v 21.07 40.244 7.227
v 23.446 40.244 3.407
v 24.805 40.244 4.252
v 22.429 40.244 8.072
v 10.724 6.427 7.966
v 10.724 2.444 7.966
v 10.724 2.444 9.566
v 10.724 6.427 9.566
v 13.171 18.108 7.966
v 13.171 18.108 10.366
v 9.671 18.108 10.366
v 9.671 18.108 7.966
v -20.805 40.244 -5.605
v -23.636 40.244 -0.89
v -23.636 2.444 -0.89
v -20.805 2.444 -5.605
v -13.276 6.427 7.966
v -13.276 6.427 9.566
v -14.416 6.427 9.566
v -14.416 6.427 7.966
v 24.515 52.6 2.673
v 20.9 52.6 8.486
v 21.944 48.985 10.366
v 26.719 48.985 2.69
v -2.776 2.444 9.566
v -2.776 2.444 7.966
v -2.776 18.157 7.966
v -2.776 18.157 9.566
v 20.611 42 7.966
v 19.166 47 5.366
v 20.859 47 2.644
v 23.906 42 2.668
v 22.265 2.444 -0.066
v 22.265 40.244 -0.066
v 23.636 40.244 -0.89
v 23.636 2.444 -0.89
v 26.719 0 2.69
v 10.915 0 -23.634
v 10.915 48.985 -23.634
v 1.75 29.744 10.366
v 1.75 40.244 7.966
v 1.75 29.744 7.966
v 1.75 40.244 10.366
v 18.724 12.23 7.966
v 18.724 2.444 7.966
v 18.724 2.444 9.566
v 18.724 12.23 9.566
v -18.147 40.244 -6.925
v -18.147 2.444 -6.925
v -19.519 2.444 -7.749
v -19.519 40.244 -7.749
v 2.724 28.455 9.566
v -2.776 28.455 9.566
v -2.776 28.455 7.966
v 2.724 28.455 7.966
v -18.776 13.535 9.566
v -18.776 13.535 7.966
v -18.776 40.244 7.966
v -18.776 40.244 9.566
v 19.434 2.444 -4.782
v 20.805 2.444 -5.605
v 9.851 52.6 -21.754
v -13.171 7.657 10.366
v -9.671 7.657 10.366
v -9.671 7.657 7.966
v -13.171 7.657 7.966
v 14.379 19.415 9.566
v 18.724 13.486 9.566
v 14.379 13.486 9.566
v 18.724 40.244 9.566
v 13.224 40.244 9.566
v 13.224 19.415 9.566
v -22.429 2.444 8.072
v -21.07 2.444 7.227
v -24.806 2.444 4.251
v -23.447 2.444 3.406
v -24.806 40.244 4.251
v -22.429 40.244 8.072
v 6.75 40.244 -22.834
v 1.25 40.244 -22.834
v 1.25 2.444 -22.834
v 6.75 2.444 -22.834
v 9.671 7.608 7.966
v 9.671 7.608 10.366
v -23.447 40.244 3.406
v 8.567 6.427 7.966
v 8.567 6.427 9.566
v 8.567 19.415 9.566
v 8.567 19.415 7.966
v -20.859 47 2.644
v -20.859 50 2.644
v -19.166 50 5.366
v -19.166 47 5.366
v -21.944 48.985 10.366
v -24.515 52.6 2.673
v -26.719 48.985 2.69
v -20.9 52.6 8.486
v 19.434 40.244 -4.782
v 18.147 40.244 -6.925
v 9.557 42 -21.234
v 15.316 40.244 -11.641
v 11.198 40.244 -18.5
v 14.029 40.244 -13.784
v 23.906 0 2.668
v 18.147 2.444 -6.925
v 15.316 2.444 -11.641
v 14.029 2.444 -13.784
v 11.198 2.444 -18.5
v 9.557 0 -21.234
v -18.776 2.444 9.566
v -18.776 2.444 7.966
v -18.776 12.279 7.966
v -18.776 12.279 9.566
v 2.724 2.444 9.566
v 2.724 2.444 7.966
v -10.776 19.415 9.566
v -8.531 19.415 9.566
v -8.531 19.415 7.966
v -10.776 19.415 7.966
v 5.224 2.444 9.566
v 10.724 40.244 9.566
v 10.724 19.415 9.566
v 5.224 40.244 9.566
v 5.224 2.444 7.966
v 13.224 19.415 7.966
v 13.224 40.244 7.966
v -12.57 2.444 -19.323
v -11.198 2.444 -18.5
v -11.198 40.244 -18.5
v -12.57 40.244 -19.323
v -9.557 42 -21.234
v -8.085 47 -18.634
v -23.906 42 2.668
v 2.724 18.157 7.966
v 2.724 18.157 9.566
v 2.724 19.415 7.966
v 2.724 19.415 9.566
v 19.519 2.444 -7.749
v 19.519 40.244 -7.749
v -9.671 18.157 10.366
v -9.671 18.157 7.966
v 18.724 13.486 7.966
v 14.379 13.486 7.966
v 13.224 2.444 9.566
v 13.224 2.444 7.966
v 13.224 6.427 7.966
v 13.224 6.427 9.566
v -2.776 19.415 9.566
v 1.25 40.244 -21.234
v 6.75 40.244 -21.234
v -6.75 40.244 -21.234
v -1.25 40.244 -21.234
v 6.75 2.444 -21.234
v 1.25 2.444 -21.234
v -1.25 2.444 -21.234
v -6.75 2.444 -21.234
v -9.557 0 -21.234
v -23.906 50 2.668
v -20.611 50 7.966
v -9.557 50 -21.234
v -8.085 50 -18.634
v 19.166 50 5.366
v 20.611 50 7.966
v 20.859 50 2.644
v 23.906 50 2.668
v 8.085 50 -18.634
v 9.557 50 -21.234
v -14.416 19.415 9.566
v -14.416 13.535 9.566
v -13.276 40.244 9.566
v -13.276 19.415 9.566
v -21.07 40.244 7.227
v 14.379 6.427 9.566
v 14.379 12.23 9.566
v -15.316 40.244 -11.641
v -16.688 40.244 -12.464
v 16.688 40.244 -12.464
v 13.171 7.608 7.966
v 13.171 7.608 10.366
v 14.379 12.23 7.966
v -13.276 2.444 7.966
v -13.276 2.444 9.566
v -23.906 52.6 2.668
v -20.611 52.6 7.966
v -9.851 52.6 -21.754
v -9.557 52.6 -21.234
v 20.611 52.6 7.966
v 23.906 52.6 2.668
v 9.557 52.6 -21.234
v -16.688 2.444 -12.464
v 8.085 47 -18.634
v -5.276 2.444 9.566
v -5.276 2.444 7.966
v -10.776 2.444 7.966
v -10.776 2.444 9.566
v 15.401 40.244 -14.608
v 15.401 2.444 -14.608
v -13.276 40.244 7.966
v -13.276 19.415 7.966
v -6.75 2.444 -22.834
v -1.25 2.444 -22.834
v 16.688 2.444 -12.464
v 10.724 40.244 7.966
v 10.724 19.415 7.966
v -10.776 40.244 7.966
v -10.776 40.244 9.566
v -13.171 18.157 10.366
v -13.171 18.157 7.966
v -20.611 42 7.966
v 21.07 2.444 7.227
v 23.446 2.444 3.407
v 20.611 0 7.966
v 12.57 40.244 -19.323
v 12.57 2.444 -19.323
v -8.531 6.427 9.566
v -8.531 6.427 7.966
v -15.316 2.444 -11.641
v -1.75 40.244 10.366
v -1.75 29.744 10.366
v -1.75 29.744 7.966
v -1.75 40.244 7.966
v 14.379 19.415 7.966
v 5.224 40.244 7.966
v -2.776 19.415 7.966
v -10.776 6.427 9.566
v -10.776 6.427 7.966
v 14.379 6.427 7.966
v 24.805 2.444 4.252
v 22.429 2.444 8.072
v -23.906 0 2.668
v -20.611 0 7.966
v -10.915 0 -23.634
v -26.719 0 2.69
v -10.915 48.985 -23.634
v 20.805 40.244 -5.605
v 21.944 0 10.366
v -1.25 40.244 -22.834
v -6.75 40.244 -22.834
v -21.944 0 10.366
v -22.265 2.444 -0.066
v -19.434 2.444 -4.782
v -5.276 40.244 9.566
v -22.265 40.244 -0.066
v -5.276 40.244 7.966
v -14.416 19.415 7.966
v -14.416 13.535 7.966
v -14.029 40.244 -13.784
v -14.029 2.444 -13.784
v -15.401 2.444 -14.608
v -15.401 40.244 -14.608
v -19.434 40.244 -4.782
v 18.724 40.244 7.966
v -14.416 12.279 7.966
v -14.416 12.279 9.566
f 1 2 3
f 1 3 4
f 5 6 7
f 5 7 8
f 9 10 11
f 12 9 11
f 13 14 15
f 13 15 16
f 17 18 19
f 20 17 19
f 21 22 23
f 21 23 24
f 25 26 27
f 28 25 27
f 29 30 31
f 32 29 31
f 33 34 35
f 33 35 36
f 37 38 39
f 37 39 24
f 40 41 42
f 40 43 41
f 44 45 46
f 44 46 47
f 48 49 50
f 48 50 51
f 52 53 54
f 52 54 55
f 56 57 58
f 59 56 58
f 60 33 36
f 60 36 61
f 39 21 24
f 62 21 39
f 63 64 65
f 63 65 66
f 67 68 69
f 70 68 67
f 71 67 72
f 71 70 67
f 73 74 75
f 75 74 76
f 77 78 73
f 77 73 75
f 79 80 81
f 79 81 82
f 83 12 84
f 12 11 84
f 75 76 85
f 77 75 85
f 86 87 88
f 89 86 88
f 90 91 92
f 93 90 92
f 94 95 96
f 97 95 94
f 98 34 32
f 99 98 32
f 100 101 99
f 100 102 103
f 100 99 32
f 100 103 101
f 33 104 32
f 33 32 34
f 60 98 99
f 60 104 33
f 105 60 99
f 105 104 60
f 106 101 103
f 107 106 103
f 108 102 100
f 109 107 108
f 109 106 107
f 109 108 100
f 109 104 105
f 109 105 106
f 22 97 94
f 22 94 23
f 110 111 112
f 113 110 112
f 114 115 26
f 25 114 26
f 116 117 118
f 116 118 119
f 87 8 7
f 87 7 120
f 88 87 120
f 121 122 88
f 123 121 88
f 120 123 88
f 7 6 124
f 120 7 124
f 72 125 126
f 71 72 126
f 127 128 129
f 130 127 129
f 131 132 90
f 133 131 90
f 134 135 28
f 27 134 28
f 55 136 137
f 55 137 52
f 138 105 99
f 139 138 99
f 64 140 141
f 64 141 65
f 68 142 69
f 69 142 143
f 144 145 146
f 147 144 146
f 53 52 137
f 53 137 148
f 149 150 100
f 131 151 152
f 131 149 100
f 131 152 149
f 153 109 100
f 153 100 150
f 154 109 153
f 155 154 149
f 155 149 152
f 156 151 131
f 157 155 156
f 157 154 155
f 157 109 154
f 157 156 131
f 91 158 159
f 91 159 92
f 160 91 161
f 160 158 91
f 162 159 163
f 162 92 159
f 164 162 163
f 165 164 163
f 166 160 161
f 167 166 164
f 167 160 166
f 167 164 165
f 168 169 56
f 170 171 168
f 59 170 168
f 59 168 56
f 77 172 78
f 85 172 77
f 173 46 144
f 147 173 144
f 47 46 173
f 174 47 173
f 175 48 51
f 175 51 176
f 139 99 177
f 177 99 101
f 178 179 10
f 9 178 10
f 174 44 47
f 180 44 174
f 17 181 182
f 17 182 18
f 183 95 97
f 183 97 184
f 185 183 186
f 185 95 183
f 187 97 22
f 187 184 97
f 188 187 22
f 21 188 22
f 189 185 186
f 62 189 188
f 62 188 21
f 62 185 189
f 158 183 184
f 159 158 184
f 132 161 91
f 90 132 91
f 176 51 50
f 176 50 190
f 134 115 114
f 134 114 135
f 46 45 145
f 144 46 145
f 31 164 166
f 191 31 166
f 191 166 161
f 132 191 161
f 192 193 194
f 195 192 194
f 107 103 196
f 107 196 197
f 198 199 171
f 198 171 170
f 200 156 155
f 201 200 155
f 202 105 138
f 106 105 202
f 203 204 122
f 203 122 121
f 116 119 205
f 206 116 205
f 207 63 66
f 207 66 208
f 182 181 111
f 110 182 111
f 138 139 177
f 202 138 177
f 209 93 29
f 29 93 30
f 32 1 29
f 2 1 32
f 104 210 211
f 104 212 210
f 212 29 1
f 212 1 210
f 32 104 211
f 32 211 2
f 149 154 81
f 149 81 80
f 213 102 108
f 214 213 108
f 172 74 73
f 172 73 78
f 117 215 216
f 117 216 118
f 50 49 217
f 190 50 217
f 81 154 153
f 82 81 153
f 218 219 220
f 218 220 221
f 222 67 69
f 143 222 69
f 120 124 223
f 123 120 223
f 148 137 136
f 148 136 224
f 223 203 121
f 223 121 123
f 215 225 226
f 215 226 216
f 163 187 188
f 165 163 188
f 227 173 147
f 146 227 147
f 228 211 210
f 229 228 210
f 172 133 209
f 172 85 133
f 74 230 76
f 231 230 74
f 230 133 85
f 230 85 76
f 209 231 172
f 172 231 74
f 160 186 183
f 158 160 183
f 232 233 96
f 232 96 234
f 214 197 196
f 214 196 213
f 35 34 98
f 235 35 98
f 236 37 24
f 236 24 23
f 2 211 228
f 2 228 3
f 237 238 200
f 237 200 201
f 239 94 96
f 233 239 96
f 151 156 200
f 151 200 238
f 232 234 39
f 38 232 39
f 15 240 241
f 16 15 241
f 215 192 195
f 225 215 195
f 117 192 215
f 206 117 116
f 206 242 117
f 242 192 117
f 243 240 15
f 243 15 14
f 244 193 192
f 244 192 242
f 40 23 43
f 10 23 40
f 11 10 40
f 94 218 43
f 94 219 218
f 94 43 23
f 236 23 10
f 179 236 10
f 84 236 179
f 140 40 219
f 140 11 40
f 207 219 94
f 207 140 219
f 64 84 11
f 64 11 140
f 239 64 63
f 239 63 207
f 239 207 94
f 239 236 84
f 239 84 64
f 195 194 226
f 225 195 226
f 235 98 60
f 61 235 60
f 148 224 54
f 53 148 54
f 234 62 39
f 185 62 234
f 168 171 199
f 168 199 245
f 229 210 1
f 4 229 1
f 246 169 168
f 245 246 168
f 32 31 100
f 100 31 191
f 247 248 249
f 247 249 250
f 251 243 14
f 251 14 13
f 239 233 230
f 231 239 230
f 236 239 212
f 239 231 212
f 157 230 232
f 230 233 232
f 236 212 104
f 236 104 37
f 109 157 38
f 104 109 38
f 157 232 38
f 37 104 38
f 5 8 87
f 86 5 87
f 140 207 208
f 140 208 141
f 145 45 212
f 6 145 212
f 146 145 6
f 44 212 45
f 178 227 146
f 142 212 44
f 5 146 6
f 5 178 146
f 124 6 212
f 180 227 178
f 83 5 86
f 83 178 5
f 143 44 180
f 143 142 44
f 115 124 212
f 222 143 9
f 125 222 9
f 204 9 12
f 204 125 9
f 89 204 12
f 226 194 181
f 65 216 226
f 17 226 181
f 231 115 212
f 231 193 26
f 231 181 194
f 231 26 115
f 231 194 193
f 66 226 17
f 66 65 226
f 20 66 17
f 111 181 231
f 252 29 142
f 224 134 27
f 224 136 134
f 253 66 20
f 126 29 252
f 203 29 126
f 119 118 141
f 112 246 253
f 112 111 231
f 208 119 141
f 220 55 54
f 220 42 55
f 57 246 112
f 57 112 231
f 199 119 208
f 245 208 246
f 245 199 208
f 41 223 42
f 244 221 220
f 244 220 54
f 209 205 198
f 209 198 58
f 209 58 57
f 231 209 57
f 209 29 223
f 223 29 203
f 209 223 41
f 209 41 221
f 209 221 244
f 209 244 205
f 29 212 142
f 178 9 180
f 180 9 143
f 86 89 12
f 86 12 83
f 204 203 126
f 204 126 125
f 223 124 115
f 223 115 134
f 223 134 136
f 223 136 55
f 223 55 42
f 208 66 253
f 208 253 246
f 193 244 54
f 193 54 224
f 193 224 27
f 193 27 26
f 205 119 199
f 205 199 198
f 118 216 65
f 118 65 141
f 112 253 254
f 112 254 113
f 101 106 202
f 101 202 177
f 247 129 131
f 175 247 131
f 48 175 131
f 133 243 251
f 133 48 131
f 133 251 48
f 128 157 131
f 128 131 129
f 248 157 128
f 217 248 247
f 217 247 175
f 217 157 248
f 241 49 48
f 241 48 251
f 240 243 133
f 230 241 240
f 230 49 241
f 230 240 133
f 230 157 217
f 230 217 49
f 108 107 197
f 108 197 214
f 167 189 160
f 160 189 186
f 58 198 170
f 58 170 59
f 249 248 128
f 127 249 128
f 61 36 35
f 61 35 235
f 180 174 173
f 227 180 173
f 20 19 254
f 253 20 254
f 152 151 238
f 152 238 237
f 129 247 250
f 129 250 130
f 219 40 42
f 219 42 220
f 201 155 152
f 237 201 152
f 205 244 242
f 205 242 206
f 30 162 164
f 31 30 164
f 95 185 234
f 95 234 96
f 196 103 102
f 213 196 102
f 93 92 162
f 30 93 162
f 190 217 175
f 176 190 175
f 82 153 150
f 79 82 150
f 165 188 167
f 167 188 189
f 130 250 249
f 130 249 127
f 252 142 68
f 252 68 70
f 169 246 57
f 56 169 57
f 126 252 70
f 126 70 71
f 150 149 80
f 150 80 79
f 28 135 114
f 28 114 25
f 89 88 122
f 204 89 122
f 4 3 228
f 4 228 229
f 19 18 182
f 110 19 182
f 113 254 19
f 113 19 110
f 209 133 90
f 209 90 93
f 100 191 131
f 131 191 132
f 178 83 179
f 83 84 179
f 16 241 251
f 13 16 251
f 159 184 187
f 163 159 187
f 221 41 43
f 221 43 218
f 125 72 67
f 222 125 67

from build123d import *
from OCP.BRepFilletAPI import BRepFilletAPI_MakeChamfer

# Parameters (mm, degrees)
BOSS_EXTRUDE1_DEPTH     = 52.6
BOSS_EXTRUDE2_DEPTH     = 10.6
CUT_EXTRUDE1_DEPTH      = 2.6
CHAMFER1_SIZE           = 4
CHAMFER1_SIZE2          = 2.08
CHAMFER2_SIZE           = 2.6
CHAMFER2_SIZE_2         = 5
SKETCH4_W               = 3.5
SKETCH4_H               = 10.5
CUT_EXTRUDE2_DEPTH      = 10
CUT_EXTRUDE3_DEPTH      = 61
SKETCH7_W               = 5.5
SKETCH7_H               = 37.8
CUT_EXTRUDE4_DEPTH      = 1.6
LPATTERN1_COUNT         = 3
LPATTERN1_PITCH         = 8
LPATTERN1_COL_COUNT     = 3
LPATTERN1_COL_PITCH     = 8
BOSS_EXTRUDE4_DEPTH     = 1.6
SKETCH9_W               = 1.140450815
SKETCH9_H               = 12.988078935
BOSS_EXTRUDE5_DEPTH     = 1.6
BOSS_EXTRUDE6_DEPTH     = 1.6
SKETCH12_W              = 5.5
SKETCH12_H              = 1.257878545
BOSS_EXTRUDE7_DEPTH     = 1.6
SKETCH13_W              = 4.498542915
SKETCH13_H              = 37.8
CUT_EXTRUDE5_DEPTH      = 1.6
SKETCH14_W              = 4.344795522
SKETCH14_H              = 1.255742166
SKETCH14_W_2            = 4.359549185
SKETCH14_H_2            = 1.256348334
BOSS_EXTRUDE8_DEPTH     = 1.6
SKETCH15_W              = 4.5
SKETCH15_H              = 37.8
CUT_EXTRUDE6_DEPTH      = 1.6
SKETCH16_W              = 5.5
SKETCH16_H              = 37.8
CUT_EXTRUDE7_DEPTH      = 1.6
LPATTERN2_COUNT         = 2
LPATTERN2_PITCH         = 8
LPATTERN2_COL_COUNT     = 2
LPATTERN2_COL_PITCH     = 8
MIRROR2_COPY_1_SKETCH_W = 5.5
MIRROR2_COPY_1_SKETCH_H = 37.8
MIRROR2_COPY_1_DEPTH    = 1.6
MIRROR2_COPY_2_SKETCH_W = 5.5
MIRROR2_COPY_2_SKETCH_H = 37.8
MIRROR2_COPY_2_DEPTH    = 1.6
SKETCH17_W              = 5.5
SKETCH17_H              = 37.8
CUT_EXTRUDE8_DEPTH      = 1.6
LPATTERN3_COUNT         = 2
LPATTERN3_PITCH         = 8


with BuildPart() as part:
    # Sketch1 → Boss-Extrude1 (new body)
    with BuildSketch(Plane(origin=(0, 0, 0), x_dir=(1, 0, 0), z_dir=(0, 1, 0))):
        Polygon((-26.953018279, -2.69203799), (-22.055294719, -10.566070483), (22.055294719, -10.566070483), (26.953018279, -2.69203799), (11.028337958, 23.833929517), (-11.028337958, 23.833929517), align=None)
        Polygon((-23.906036559, -2.668005496), (-20.610589438, -7.966070483), (20.610589438, -7.966070483), (23.906036559, -2.668005496), (9.556675916, 21.233929517), (-9.556675916, 21.233929517), align=None, mode=Mode.SUBTRACT)
    extrude(amount=BOSS_EXTRUDE1_DEPTH)

    # Sketch2 → Boss-Extrude2 (add)
    with BuildSketch(Plane(origin=(0, 52.6, 0), x_dir=(1, 0, 0), z_dir=(0, 1, 0))):
        Polygon((-23.906036559, -2.668005496), (-20.610589438, -7.966070483), (20.610589438, -7.966070483), (23.906036559, -2.668005496), (9.556675916, 21.233929517), (-9.556675916, 21.233929517), align=None)
        Polygon((-20.859054838, -2.643973003), (-19.165884157, -5.366070483), (19.165884157, -5.366070483), (20.859054838, -2.643973003), (8.085013874, 18.633929517), (-8.085013874, 18.633929517), align=None, mode=Mode.SUBTRACT)
    extrude(amount=-BOSS_EXTRUDE2_DEPTH)

    # Sketch3 → Cut-Extrude1 (cut)
    with BuildSketch(Plane(origin=(0, 52.6, 0), x_dir=(1, 0, 0), z_dir=(0, 1, 0))):
        Polygon((-23.906036559, -2.668005496), (-20.610589438, -7.966070483), (20.610589438, -7.966070483), (23.906036559, -2.668005496), (9.556675916, 21.233929517), (-9.556675916, 21.233929517), align=None)
        Polygon((-20.859054838, -2.643973003), (-19.165884157, -5.366070483), (19.165884157, -5.366070483), (20.859054838, -2.643973003), (8.085013874, 18.633929517), (-8.085013874, 18.633929517), align=None, mode=Mode.SUBTRACT)
    extrude(amount=-CUT_EXTRUDE1_DEPTH, mode=Mode.SUBTRACT)

    # Chamfer1: one chamfer whose edges measure the first distance from different faces: ONE call of the kernel's chamfer builder (chamfer() names one face for all edges)
    chamfer1_edges_1 = [part.edges().sort_by_distance(p)[0] for p in [
        (-18.990678119, 52.6, -10.570945764),
    ]]
    chamfer1_side_1 = [part.faces().sort_by_distance(p)[0] for p in [
        (-18.990678119, 26.3, -10.570945764),
    ]]
    chamfer1_edges_2 = [part.edges().sort_by_distance(p)[0] for p in [
        (-24.504156499, 52.6, 6.629054236),
    ]]
    chamfer1_side_2 = [part.faces().sort_by_distance(p)[0] for p in [
        (-24.504156499, 26.3, 6.629054236),
    ]]
    chamfer1_edges_3 = [part.edges().sort_by_distance(p)[0] for p in [
        (0, 52.6, 10.566070483),
    ]]
    chamfer1_side_3 = [part.faces().sort_by_distance(p)[0] for p in [
        (0, 26.3, 10.566070483),
    ]]
    chamfer1_edges_4 = [part.edges().sort_by_distance(p)[0] for p in [
        (24.504156499, 52.6, 6.629054236),
    ]]
    chamfer1_side_4 = [part.faces().sort_by_distance(p)[0] for p in [
        (24.504156499, 26.3, 6.629054236),
    ]]
    chamfer1_edges_5 = [part.edges().sort_by_distance(p)[0] for p in [
        (18.990678119, 52.6, -10.570945764),
    ]]
    chamfer1_side_5 = [part.faces().sort_by_distance(p)[0] for p in [
        (18.990678119, 26.3, -10.570945764),
    ]]
    chamfer1_edges_6 = [part.edges().sort_by_distance(p)[0] for p in [
        (0, 52.6, -23.833929517),
    ]]
    chamfer1_side_6 = [part.faces().sort_by_distance(p)[0] for p in [
        (0, 26.3, -23.833929517),
    ]]
    chamfer1 = BRepFilletAPI_MakeChamfer(part.part.solid().wrapped)
    for e in chamfer1_edges_1:
        chamfer1.Add(CHAMFER1_SIZE, CHAMFER1_SIZE2, e.wrapped, chamfer1_side_1[0].wrapped)  # the first distance lies on this face
    for e in chamfer1_edges_2:
        chamfer1.Add(CHAMFER1_SIZE, CHAMFER1_SIZE2, e.wrapped, chamfer1_side_2[0].wrapped)  # the first distance lies on this face
    for e in chamfer1_edges_3:
        chamfer1.Add(CHAMFER1_SIZE, CHAMFER1_SIZE2, e.wrapped, chamfer1_side_3[0].wrapped)  # the first distance lies on this face
    for e in chamfer1_edges_4:
        chamfer1.Add(CHAMFER1_SIZE, CHAMFER1_SIZE2, e.wrapped, chamfer1_side_4[0].wrapped)  # the first distance lies on this face
    for e in chamfer1_edges_5:
        chamfer1.Add(CHAMFER1_SIZE, CHAMFER1_SIZE2, e.wrapped, chamfer1_side_5[0].wrapped)  # the first distance lies on this face
    for e in chamfer1_edges_6:
        chamfer1.Add(CHAMFER1_SIZE, CHAMFER1_SIZE2, e.wrapped, chamfer1_side_6[0].wrapped)  # the first distance lies on this face
    add(Compound.cast(chamfer1.Shape()), mode=Mode.REPLACE)

    # Chamfer2
    chamfer2_edges_1 = [part.edges().sort_by_distance(p)[0] for p in [
        (0, 42, -18.633929517),
    ]]
    chamfer2_side_1 = [part.faces().sort_by_distance(p)[0] for p in [
        (0, 42, -18.685929517),
    ]]
    chamfer2_edges_2 = [part.edges().sort_by_distance(p)[0] for p in [
        (-14.472034356, 42, -7.994978257),
    ]]
    chamfer2_side_2 = [part.faces().sort_by_distance(p)[0] for p in [
        (-14.516617239, 42, -8.021743281),
    ]]
    chamfer2_edges_3 = [part.edges().sort_by_distance(p)[0] for p in [
        (-20.012469497, 42, 4.005021743),
    ]]
    chamfer2_side_3 = [part.faces().sort_by_distance(p)[0] for p in [
        (-20.056624652, 42, 4.032486672),
    ]]
    chamfer2_edges_4 = [part.edges().sort_by_distance(p)[0] for p in [
        (0, 42, 5.366070483),
    ]]
    chamfer2_side_4 = [part.faces().sort_by_distance(p)[0] for p in [
        (0, 42, 5.418070483),
    ]]
    chamfer2_edges_5 = [part.edges().sort_by_distance(p)[0] for p in [
        (20.012469497, 42, 4.005021743),
    ]]
    chamfer2_side_5 = [part.faces().sort_by_distance(p)[0] for p in [
        (20.056624652, 42, 4.032486672),
    ]]
    chamfer2_edges_6 = [part.edges().sort_by_distance(p)[0] for p in [
        (14.472034356, 42, -7.994978257),
    ]]
    chamfer2_side_6 = [part.faces().sort_by_distance(p)[0] for p in [
        (14.516617239, 42, -8.021743281),
    ]]
    chamfer2 = BRepFilletAPI_MakeChamfer(part.part.solid().wrapped)
    for e in chamfer2_edges_1:
        chamfer2.Add(CHAMFER2_SIZE - 0.0001, CHAMFER2_SIZE_2 - 0.0001, e.wrapped, chamfer2_side_1[0].wrapped)
    for e in chamfer2_edges_2:
        chamfer2.Add(CHAMFER2_SIZE - 0.0001, CHAMFER2_SIZE_2 - 0.0001, e.wrapped, chamfer2_side_2[0].wrapped)
    for e in chamfer2_edges_3:
        chamfer2.Add(CHAMFER2_SIZE - 0.0001, CHAMFER2_SIZE_2 - 0.0001, e.wrapped, chamfer2_side_3[0].wrapped)
    for e in chamfer2_edges_4:
        chamfer2.Add(CHAMFER2_SIZE - 0.0001, CHAMFER2_SIZE_2 - 0.0001, e.wrapped, chamfer2_side_4[0].wrapped)
    for e in chamfer2_edges_5:
        chamfer2.Add(CHAMFER2_SIZE - 0.0001, CHAMFER2_SIZE_2 - 0.0001, e.wrapped, chamfer2_side_5[0].wrapped)
    for e in chamfer2_edges_6:
        chamfer2.Add(CHAMFER2_SIZE - 0.0001, CHAMFER2_SIZE_2 - 0.0001, e.wrapped, chamfer2_side_6[0].wrapped)
    add(Compound.cast(chamfer2.Shape()), mode=Mode.REPLACE)  # a hair under: the kernel refuses the full size

    # Sketch4 → Cut-Extrude2 (cut)
    with BuildSketch(Plane.XY.offset(10.566070483)):
        with Locations((0, 34.994195005)):
            Rectangle(SKETCH4_W, SKETCH4_H)
        with Locations((-11.42081888, 12.906843201)):
            Rectangle(SKETCH4_W, SKETCH4_H)
        with Locations((11.42081888, 12.857646379)):
            Rectangle(SKETCH4_W, SKETCH4_H)
    extrude(amount=-CUT_EXTRUDE2_DEPTH, mode=Mode.SUBTRACT)

    # Sketch6 → Cut-Extrude3 (cut)
    with BuildSketch(Plane.XZ):
        Polygon((11.028337958, -23.833929517), (26.953018279, 2.69203799), (22.055294719, 10.566070483), (-22.055294719, 10.566070483), (-26.953018279, 2.69203799), (-11.028337958, -23.833929517), align=None)
        Polygon((10.915133186, -23.633929517), (26.71863507, 2.690189336), (21.944163543, 10.366070483), (-21.944163543, 10.366070483), (-26.71863507, 2.690189336), (-10.915133186, -23.633929517), align=None, mode=Mode.SUBTRACT)
    extrude(amount=-CUT_EXTRUDE3_DEPTH, mode=Mode.SUBTRACT)

    # Sketch7 → Cut-Extrude4 (cut)
    with BuildSketch(Plane(origin=(0, 0, 7.966070483), x_dir=(-1, 0, 0), z_dir=(0, 0, -1))):
        with Locations((0.025767353, 21.344195005)):
            Rectangle(SKETCH7_W, SKETCH7_H)
    cut_extrude4 = extrude(amount=-CUT_EXTRUDE4_DEPTH, mode=Mode.SUBTRACT)

    # LPattern1: Cut-Extrude4 ×3
    with Locations(*[(-i * LPATTERN1_PITCH, 0, 0) for i in range(1, LPATTERN1_COUNT)]):
        add(cut_extrude4, mode=Mode.SUBTRACT)

    # LPattern1 col: Cut-Extrude4 ×3
    with Locations(*[(i * LPATTERN1_COL_PITCH, 0, 0) for i in range(1, LPATTERN1_COL_COUNT)]):
        add(cut_extrude4, mode=Mode.SUBTRACT)

    # Sketch8 → Boss-Extrude4 (add)
    with BuildSketch(Plane(origin=(0, 0, 9.566070483), x_dir=(-1, 0, 0), z_dir=(0, 0, -1))):
        Polygon((2.775767353, 40.244195005), (2.775767353, 28.454622031), (-2.724232647, 28.454622031), (-2.724232647, 40.244195005), (-1.75, 40.244195005), (-1.75, 29.744195005), (1.75, 29.744195005), (1.75, 40.244195005), align=None)
    extrude(amount=BOSS_EXTRUDE4_DEPTH)

    # Sketch9 → Boss-Extrude5 (add)
    with BuildSketch(Plane(origin=(0, 0, 9.566070483), x_dir=(-1, 0, 0), z_dir=(0, 0, -1))):
        Polygon((10.775767353, 18.156843201), (9.67081888, 18.156843201), (9.67081888, 7.656843201), (10.775767353, 7.656843201), (10.775767353, 6.426642811), (8.531242664, 6.426642811), (8.531242664, 19.414721746), (10.775767353, 19.414721746), align=None)
        with Locations((13.84599276, 12.920682279)):
            Rectangle(SKETCH9_W, SKETCH9_H)
    extrude(amount=BOSS_EXTRUDE5_DEPTH)

    # Sketch11 → Boss-Extrude6 (add)
    with BuildSketch(Plane(origin=(0, 0, 9.566070483), x_dir=(-1, 0, 0), z_dir=(0, 0, -1))):
        Polygon((-10.724232647, 18.107646379), (-9.67081888, 18.107646379), (-9.67081888, 7.607646379), (-10.724232647, 7.607646379), (-10.724232647, 6.426642811), (-8.566553257, 6.426642811), (-8.566553257, 19.414721746), (-10.724232647, 19.414721746), align=None)
        Polygon((-13.17081888, 18.107646379), (-13.224232647, 19.414721746), (-14.379437125, 19.414721746), (-14.379437125, 6.426642811), (-13.17081888, 6.426642811), align=None)
    extrude(amount=BOSS_EXTRUDE6_DEPTH)

    # Sketch12 → Boss-Extrude7 (add)
    with BuildSketch(Plane(origin=(0, 0, 9.566070483), x_dir=(-1, 0, 0), z_dir=(0, 0, -1))):
        with Locations((0.025767353, 18.785782473)):
            Rectangle(SKETCH12_W, SKETCH12_H)
    extrude(amount=BOSS_EXTRUDE7_DEPTH)

    # Sketch13 → Cut-Extrude5 (cut)
    with BuildSketch(Plane(origin=(18.433655639, 0, 11.465910206), x_dir=(-0.5281717070926116, 0, 0.8491375906335065), z_dir=(-0.8491375906335065, 0, -0.5281717070926116))):
        with Locations((-7.241314346, 21.344195005)):
            Rectangle(SKETCH13_W, SKETCH13_H)
    extrude(amount=-CUT_EXTRUDE5_DEPTH, mode=Mode.SUBTRACT)

    # Sketch14 → Boss-Extrude8 (add)
    with BuildSketch(Plane(origin=(0, 0, 7.966070483), x_dir=(-1, 0, 0), z_dir=(0, 0, -1))):
        with Locations((-16.551834886, 12.857646379)):
            Rectangle(SKETCH14_W, SKETCH14_H)
        with Locations((16.595992761, 12.906843201)):
            Rectangle(SKETCH14_W_2, SKETCH14_H_2)
    extrude(amount=-BOSS_EXTRUDE8_DEPTH)

    # Sketch15 → Cut-Extrude6 (cut)
    with BuildSketch(Plane(origin=(-18.433655639, 0, 11.465910206), x_dir=(-0.5281717070926114, 0, -0.8491375906335067), z_dir=(0.8491375906335068, 0, -0.5281717070926114))):
        with Locations((7.242042888, 21.344195005)):
            Rectangle(SKETCH15_W, SKETCH15_H)
    extrude(amount=-CUT_EXTRUDE6_DEPTH, mode=Mode.SUBTRACT)

    # Sketch16 → Cut-Extrude7 (cut)
    with BuildSketch(Plane(origin=(-16.39526965, 0, -9.84278624), x_dir=(0.5147120046125901, 0, -0.8573631391118287), z_dir=(0.8573631391118287, 0, 0.5147120046125901))):
        with Locations((-0.652960459, 21.344195005)):
            Rectangle(SKETCH16_W, SKETCH16_H)
    cut_extrude7 = extrude(amount=-CUT_EXTRUDE7_DEPTH, mode=Mode.SUBTRACT)

    # LPattern2: Cut-Extrude7 ×2
    with Locations(*[Vector(-0.5147120046125903, 0, 0.8573631391118287) * (i * LPATTERN2_PITCH) for i in range(1, LPATTERN2_COUNT)]):
        add(cut_extrude7, mode=Mode.SUBTRACT)

    # LPattern2 col: Cut-Extrude7 ×2
    with Locations(*[Vector(0.5147120046125899, 0, -0.8573631391118288) * (i * LPATTERN2_COL_PITCH) for i in range(1, LPATTERN2_COL_COUNT)]):
        add(cut_extrude7, mode=Mode.SUBTRACT)

    # Mirror2: Cut-Extrude7 across plane
    add(cut_extrude7.mirror(Plane(origin=(0, 0, 0), x_dir=(0, 0, 1), z_dir=(1, 0, 0))), mode=Mode.SUBTRACT)

    # Mirror2 copy 1 sketch → Mirror2 copy 1 (cut)
    with BuildSketch(Plane(origin=(20.512965687, 0, -2.983881127), x_dir=(-0.5147120046125901, 0, -0.8573631391118287), z_dir=(-0.8573631391118287, 0, 0.5147120046125901))):
        with Locations((-0.652960459, -21.344195005)):
            Rectangle(MIRROR2_COPY_1_SKETCH_W, MIRROR2_COPY_1_SKETCH_H)
    extrude(amount=-MIRROR2_COPY_1_DEPTH, mode=Mode.SUBTRACT)

    # Mirror2 copy 2 sketch → Mirror2 copy 2 (cut)
    with BuildSketch(Plane(origin=(12.277573614, 0, -16.701691352), x_dir=(-0.5147120046125901, 0, -0.8573631391118287), z_dir=(-0.8573631391118287, 0, 0.5147120046125901))):
        with Locations((-0.652960459, -21.344195005)):
            Rectangle(MIRROR2_COPY_2_SKETCH_W, MIRROR2_COPY_2_SKETCH_H)
    extrude(amount=-MIRROR2_COPY_2_DEPTH, mode=Mode.SUBTRACT)

    # Sketch17 → Cut-Extrude8 (cut)
    with BuildSketch(Plane.XY.offset(-21.233929517)):
        with Locations((4, 21.344195005)):
            Rectangle(SKETCH17_W, SKETCH17_H)
    cut_extrude8 = extrude(amount=-CUT_EXTRUDE8_DEPTH, mode=Mode.SUBTRACT)

    # LPattern3: Cut-Extrude8 ×2
    with Locations(*[(-i * LPATTERN3_PITCH, 0, 0) for i in range(1, LPATTERN3_COUNT)]):
        add(cut_extrude8, mode=Mode.SUBTRACT)


solid = part.part
